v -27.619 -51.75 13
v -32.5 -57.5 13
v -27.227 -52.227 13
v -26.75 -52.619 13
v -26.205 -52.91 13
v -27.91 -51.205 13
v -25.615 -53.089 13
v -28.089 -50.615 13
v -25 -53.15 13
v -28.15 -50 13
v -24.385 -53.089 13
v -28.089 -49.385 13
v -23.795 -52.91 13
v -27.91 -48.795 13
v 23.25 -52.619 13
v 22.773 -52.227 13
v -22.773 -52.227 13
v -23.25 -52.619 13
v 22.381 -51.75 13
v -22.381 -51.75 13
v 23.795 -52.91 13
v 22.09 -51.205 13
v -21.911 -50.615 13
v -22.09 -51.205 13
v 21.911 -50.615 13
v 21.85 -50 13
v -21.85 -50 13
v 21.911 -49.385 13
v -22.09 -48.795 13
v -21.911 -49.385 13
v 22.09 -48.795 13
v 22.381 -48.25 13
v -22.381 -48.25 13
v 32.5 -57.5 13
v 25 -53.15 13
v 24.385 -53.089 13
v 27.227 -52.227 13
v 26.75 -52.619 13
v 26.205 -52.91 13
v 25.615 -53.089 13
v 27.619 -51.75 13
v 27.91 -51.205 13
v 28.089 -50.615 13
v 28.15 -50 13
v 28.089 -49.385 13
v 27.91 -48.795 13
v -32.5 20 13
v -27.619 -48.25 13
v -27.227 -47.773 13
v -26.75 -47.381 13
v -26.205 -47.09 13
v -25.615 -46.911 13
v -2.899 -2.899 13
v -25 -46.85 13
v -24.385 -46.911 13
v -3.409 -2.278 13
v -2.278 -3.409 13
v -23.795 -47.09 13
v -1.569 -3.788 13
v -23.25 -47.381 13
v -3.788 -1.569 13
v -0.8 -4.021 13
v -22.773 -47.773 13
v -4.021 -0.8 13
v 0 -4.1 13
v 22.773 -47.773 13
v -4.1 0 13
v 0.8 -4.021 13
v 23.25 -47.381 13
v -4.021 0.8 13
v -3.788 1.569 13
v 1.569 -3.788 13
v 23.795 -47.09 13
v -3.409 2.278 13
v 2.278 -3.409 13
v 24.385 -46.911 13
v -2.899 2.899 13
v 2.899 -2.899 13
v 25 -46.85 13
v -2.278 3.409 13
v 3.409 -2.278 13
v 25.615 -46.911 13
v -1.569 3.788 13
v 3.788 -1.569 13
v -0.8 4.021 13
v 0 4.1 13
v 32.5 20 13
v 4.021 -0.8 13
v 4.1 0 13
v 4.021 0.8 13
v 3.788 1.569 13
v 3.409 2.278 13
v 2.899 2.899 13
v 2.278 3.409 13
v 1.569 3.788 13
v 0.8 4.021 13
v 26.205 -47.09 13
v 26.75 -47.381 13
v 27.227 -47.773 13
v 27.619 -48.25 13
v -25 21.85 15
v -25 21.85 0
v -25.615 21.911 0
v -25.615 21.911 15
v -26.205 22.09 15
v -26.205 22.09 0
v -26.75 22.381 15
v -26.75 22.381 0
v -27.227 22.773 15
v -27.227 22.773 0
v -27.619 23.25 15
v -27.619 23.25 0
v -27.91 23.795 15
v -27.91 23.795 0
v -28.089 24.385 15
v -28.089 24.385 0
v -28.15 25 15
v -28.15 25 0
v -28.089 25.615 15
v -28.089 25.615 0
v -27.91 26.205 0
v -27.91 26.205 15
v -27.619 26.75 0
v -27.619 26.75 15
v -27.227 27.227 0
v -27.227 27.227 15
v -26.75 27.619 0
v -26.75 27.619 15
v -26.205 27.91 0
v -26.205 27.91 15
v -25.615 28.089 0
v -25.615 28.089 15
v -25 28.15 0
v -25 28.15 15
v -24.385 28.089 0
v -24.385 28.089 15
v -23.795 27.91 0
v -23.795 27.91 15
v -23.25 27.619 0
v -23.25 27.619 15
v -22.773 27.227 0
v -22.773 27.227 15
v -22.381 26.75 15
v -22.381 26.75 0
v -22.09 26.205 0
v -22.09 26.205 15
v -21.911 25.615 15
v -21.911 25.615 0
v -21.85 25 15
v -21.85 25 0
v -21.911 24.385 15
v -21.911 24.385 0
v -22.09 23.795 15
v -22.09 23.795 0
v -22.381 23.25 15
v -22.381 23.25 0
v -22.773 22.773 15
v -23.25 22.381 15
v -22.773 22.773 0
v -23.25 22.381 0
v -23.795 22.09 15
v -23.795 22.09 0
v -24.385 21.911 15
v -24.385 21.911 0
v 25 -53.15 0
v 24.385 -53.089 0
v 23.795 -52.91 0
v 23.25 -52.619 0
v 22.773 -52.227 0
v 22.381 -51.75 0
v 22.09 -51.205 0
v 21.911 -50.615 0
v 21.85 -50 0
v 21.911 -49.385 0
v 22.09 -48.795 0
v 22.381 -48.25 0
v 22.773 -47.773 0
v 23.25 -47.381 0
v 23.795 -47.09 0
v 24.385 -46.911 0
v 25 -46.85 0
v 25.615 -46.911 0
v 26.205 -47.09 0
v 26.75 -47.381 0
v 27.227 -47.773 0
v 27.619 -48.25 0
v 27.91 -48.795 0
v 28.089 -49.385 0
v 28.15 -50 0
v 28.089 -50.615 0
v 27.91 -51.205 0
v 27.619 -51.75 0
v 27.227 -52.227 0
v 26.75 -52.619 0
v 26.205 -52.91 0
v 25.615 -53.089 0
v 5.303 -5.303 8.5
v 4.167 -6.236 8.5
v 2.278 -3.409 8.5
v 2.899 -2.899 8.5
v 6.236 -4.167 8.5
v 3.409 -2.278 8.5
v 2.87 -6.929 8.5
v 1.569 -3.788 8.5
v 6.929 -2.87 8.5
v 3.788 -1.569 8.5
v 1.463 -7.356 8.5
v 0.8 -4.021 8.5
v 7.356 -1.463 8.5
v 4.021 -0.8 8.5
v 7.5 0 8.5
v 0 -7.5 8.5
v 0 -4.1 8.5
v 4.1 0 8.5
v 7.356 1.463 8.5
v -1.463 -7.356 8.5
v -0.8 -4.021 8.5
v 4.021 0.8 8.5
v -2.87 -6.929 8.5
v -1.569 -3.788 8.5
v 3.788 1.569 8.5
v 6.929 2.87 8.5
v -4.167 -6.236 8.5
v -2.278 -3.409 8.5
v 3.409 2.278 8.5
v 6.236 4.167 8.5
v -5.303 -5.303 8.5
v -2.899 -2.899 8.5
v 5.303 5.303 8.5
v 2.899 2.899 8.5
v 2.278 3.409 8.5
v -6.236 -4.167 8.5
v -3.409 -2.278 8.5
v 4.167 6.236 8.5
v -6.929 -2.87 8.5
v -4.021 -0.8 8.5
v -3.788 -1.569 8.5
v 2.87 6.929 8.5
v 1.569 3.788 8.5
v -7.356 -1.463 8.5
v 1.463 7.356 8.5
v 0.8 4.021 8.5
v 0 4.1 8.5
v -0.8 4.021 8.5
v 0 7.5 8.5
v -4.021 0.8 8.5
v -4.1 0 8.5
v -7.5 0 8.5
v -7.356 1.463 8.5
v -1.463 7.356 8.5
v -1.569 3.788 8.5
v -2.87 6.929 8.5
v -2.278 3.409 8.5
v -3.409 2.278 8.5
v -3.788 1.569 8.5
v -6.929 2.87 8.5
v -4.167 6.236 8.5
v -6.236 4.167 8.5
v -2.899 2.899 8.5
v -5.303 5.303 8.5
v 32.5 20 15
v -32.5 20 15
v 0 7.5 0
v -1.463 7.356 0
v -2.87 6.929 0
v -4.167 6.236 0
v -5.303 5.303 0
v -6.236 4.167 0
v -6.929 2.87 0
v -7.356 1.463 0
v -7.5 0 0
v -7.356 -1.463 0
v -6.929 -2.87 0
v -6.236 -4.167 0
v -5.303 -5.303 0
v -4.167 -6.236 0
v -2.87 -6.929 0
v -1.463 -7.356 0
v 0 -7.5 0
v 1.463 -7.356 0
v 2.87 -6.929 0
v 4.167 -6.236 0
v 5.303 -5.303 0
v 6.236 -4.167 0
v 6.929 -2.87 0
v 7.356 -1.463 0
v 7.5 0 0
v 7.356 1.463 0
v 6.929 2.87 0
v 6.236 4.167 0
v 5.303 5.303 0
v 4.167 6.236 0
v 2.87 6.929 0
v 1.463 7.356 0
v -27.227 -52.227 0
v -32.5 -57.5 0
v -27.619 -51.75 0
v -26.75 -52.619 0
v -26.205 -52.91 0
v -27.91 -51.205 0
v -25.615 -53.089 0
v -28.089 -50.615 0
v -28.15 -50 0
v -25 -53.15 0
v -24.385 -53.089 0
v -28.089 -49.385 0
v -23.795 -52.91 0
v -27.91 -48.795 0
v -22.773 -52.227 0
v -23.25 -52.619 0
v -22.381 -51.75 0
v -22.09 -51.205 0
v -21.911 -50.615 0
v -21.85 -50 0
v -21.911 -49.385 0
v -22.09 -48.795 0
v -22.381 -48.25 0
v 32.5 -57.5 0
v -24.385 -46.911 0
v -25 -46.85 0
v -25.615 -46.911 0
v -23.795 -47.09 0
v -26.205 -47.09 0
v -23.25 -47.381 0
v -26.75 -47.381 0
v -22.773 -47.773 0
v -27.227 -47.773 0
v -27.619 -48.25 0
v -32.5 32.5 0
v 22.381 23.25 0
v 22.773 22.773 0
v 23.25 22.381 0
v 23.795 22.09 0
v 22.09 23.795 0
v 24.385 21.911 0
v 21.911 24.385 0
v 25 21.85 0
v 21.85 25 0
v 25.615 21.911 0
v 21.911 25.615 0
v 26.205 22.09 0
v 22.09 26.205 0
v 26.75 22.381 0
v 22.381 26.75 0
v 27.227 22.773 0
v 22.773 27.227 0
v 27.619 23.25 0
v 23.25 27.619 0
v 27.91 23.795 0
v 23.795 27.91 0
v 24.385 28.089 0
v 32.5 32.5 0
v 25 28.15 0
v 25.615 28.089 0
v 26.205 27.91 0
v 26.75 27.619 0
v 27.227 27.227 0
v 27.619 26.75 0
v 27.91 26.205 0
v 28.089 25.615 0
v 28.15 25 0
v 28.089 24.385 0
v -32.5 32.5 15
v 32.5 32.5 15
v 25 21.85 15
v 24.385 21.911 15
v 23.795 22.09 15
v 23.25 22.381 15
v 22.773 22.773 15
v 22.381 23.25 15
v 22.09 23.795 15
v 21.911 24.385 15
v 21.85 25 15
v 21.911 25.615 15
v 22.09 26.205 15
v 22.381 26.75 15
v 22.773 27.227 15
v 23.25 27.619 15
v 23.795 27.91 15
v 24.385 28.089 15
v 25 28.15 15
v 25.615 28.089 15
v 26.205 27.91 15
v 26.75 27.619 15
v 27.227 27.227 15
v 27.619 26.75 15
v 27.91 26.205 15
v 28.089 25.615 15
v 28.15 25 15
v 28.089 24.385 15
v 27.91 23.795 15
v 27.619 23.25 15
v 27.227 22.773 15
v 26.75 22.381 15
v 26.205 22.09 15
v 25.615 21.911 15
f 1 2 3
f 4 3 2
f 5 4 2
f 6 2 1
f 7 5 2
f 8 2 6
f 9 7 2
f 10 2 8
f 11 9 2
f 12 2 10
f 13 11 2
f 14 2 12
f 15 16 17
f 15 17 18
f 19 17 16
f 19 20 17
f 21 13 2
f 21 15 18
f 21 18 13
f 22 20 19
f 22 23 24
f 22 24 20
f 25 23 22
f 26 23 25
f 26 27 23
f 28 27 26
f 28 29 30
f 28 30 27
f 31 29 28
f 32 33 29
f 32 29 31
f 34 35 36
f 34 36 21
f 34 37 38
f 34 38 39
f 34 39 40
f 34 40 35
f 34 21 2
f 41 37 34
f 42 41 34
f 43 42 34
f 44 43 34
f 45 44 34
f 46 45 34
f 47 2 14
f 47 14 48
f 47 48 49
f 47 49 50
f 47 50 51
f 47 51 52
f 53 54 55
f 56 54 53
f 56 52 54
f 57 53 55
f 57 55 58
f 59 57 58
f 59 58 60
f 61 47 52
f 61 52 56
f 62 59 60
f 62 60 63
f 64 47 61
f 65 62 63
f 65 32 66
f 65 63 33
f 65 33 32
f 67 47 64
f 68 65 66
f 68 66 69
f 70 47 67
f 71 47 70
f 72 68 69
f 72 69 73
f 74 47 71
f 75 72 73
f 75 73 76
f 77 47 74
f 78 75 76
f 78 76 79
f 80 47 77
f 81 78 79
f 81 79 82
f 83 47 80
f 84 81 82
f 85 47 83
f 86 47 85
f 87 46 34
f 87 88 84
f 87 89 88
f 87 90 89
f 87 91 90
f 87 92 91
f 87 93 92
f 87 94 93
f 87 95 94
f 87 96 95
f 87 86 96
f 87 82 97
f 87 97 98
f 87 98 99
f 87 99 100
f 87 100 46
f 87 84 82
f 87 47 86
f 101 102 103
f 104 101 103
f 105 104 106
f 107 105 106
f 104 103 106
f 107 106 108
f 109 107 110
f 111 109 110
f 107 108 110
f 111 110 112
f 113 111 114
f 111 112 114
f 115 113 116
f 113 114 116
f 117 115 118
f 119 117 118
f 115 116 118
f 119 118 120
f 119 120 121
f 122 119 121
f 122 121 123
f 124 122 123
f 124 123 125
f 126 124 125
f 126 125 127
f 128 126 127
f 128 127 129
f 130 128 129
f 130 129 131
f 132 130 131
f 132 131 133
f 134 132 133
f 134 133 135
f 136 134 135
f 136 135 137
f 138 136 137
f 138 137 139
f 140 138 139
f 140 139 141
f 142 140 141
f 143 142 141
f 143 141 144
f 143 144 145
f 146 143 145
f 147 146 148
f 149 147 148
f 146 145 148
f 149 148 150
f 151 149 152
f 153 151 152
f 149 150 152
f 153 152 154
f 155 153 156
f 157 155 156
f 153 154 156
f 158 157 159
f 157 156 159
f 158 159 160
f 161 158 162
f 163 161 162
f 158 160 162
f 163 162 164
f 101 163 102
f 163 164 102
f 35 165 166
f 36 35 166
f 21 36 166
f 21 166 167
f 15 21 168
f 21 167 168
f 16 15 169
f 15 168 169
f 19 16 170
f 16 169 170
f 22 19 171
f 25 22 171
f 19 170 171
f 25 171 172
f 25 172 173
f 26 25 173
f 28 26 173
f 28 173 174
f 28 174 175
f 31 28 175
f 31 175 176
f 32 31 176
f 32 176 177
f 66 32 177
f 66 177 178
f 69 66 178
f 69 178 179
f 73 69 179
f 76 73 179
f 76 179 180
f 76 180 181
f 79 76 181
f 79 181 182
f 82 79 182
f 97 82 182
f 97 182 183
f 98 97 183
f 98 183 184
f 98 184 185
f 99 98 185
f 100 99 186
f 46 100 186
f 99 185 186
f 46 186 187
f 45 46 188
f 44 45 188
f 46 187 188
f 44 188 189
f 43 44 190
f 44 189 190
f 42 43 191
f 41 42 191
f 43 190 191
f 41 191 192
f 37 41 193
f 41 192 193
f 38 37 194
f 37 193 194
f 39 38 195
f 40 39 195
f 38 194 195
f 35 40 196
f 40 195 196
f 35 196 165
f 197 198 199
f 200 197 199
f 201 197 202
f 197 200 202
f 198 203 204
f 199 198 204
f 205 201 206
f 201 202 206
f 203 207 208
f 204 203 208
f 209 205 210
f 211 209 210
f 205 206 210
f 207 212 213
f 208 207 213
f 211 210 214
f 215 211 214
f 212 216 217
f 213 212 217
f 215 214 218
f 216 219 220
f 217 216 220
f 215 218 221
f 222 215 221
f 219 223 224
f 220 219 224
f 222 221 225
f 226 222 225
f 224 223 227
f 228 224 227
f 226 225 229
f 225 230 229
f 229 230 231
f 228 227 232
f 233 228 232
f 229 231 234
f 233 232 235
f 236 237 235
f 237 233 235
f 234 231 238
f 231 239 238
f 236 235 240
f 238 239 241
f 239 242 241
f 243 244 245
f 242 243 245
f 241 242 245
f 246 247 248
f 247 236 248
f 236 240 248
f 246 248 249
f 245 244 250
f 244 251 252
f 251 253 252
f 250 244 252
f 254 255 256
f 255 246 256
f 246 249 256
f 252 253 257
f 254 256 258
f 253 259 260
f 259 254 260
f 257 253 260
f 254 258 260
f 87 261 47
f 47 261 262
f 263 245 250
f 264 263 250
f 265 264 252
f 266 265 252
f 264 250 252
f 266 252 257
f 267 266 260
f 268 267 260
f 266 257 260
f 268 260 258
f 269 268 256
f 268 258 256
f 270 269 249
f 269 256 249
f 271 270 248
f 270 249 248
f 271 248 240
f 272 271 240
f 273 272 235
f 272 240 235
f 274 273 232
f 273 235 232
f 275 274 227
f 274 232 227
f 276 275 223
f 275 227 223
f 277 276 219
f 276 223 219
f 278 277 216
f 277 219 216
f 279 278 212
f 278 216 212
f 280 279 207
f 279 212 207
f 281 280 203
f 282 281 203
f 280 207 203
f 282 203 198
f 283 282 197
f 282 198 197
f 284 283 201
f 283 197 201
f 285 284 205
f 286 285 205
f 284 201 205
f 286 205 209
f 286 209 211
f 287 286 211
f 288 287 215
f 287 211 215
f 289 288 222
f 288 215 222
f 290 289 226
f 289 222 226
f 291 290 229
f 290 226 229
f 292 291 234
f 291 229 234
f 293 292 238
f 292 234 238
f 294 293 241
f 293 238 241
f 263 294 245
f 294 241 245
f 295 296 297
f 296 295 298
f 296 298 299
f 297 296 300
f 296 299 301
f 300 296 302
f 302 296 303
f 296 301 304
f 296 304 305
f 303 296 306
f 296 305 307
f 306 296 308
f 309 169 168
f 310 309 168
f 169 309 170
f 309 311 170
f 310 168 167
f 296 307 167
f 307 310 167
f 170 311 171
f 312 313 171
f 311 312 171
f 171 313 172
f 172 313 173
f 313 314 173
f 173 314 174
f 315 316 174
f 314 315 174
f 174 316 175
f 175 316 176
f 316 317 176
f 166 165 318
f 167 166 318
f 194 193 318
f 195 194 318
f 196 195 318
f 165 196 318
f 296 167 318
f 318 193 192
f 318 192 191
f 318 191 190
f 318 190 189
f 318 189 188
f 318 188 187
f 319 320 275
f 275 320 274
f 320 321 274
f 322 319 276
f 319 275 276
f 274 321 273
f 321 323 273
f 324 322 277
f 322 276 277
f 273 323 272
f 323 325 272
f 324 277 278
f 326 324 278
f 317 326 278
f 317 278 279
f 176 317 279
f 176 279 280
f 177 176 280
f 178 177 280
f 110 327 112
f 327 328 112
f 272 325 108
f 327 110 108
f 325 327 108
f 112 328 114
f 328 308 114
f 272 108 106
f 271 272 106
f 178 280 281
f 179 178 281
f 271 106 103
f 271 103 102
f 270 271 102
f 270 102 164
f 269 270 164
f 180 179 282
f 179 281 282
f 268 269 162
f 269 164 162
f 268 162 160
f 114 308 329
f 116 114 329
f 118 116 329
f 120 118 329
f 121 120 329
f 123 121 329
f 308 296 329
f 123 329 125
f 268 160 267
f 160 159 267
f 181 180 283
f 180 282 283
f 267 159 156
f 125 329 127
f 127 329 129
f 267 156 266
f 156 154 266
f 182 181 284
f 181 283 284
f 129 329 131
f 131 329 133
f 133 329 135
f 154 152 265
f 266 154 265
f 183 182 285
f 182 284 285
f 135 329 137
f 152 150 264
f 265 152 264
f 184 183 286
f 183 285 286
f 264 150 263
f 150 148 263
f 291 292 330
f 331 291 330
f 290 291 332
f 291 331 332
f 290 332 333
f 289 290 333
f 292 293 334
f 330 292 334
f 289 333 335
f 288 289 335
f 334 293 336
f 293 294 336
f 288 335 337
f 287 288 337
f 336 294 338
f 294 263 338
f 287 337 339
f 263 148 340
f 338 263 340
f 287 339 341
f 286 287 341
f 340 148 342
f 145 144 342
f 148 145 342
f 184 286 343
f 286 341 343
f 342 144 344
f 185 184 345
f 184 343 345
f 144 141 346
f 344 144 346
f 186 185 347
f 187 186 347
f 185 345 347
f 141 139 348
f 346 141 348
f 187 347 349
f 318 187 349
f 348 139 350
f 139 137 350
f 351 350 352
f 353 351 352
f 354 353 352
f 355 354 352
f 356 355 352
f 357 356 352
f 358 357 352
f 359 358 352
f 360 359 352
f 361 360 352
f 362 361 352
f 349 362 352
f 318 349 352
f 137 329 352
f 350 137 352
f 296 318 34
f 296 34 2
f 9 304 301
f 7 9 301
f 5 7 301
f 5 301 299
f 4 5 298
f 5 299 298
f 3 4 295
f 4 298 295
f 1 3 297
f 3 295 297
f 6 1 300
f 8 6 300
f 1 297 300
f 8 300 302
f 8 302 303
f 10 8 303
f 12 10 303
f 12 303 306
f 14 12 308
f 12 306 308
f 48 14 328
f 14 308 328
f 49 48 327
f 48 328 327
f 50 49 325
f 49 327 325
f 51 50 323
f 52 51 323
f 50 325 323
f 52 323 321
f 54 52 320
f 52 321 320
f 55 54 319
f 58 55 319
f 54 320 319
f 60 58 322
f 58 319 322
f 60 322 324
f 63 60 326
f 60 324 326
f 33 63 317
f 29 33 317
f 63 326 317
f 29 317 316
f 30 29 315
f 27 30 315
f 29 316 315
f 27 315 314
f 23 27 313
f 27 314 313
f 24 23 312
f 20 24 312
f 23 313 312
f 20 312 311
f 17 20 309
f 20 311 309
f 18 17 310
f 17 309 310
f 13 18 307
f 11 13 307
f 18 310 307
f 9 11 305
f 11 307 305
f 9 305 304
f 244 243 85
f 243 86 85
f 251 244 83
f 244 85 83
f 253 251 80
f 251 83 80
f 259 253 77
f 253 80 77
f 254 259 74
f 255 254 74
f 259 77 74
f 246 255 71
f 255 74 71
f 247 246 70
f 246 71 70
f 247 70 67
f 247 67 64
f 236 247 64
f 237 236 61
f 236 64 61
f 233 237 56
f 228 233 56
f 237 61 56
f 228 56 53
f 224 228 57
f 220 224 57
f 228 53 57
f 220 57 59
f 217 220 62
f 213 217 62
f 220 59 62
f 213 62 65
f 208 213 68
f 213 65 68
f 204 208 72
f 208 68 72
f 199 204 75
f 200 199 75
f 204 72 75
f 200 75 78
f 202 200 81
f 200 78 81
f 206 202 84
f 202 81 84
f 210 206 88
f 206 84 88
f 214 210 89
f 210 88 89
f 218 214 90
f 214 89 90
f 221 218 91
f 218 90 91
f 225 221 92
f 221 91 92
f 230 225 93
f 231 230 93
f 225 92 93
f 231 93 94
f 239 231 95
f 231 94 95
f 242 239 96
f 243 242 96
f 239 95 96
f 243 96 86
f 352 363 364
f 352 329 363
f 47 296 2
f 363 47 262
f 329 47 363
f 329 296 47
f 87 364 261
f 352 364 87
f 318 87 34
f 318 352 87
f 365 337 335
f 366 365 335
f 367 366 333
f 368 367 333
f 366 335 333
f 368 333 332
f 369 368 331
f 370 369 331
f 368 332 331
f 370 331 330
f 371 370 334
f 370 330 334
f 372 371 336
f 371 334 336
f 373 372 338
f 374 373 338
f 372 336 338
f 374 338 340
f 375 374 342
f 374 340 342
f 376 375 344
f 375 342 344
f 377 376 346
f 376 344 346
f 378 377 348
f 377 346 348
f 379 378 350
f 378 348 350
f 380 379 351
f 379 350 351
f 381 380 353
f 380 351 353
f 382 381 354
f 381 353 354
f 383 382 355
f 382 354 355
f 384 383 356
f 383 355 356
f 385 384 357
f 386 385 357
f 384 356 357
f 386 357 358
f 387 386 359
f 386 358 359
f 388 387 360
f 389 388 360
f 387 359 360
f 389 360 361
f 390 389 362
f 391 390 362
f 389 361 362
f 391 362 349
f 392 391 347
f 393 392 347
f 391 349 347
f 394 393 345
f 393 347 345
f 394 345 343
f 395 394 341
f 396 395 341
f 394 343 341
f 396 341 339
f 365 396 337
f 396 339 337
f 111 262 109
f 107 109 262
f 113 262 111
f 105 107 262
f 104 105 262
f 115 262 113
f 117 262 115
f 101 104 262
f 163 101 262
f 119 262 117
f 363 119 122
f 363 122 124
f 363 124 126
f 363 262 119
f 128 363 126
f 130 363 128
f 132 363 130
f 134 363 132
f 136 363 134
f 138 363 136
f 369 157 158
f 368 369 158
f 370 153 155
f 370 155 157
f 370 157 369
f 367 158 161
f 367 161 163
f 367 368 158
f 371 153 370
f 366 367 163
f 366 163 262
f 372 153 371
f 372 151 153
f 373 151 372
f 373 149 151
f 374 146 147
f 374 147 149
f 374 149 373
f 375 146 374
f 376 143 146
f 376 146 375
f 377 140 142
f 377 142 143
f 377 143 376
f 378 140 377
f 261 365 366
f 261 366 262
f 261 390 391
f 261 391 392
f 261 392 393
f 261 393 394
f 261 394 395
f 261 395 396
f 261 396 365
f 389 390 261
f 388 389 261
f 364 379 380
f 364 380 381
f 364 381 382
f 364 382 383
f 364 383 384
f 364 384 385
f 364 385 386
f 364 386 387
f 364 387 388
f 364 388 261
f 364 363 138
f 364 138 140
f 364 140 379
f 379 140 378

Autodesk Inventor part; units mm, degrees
ref_plane "YZ Plane" through (0, 0, 0) normal (1, 0, 0) x (0, 1, 0)
ref_plane "XZ Plane" through (0, 0, 0) normal (0, 1, 0) x (-1, 0, 0)
ref_plane "XY Plane" through (0, 0, 0) normal (0, 0, 1) x (1, 0, 0)
sketch "Sketch1" plane through (0, 0, 0) normal (0, 0, 1) x (1, 0, 0)
  line L0 (-45.5, 0) -> (45.5, 0) construction
  line L1 (0, -75.5) -> (0, 50.5) construction
  line L2 (-32.5, 32.5) -> (32.5, 32.5)
  line L3 (32.5, 32.5) -> (32.5, -57.5)
  line L4 (32.5, -57.5) -> (-32.5, -57.5)
  line L5 (-32.5, -57.5) -> (-32.5, 32.5)
  point P0 (0, 0)
  point P1 (0, 32.5)
  point P2 (32.5, -12.5)
  dimension "d0" = 65
  dimension "d28" = 32.5
  dimension "d29" = 57.5
extrude "Extrusion1" add sketch "Sketch1" along normal blind 15
sketch "Sketch2" plane through (0, 0, 0) normal (0, 0, -1) x (-1, 0, 0)
  point P0 (0, 0)
hole "Hole1" at (0, 0, 0) direction (0, 0, 1) diameter 8.2 end through all counterbore diameter 15 counterbore depth 8.5
sketch "Sketch3" plane through (0, 0, 15) normal (0, 0, 1) x (1, 0, 0)
  line L0 (-45.5, 0) -> (45.5, 0) projected
  line L1 (0, -75.5) -> (0, 50.5) projected
  point P0 (0, 0)
  point P1 (-25, 25)
  dimension "d16" = 25
  dimension "d17" = 25
hole "Hole2" at (-25, 25, 15) direction (0, 0, -1) diameter 6.3 end through all
pattern_linear "Rectangular Pattern2" count 2 spacing 50 along (1, 0, 0) count 2 spacing 75 along (0, -1, 0) of "Hole2"
sketch "Sketch4" plane through (0, 0, 15) normal (0, 0, 1) x (1, 0, 0)
  circle A0 centre (0, 0) radius 4.1 construction
  line L0 (32.5, 32.5) -> (32.5, -57.5) construction
  line L1 (32.5, -57.5) -> (-32.5, -57.5) construction
  line L2 (-32.5, -57.5) -> (-32.5, 32.5) construction
  line L3 (-32.5, 32.5) -> (32.5, 32.5) construction
  line L4 (-32.5, -57.5) -> (32.5, -57.5)
  line L5 (32.5, -57.5) -> (32.5, 20)
  line L6 (32.5, 20) -> (-32.5, 20)
  line L7 (-32.5, 20) -> (-32.5, -57.5)
  circle A1 centre (25, -50) radius 3.15 projected
  circle A2 centre (-25, -50) radius 3.15 projected
  circle A3 centre (25, 25) radius 3.15 projected
  circle A4 centre (-25, 25) radius 3.15 projected
  dimension "d42" = 20
extrude "Extrusion2" cut sketch "Sketch4" against normal blind 2 contours L7 L6 L5 L4 | A1 | A2
equation "\"d17\" = d16"
properties part number "P101" material "Aluminium"
